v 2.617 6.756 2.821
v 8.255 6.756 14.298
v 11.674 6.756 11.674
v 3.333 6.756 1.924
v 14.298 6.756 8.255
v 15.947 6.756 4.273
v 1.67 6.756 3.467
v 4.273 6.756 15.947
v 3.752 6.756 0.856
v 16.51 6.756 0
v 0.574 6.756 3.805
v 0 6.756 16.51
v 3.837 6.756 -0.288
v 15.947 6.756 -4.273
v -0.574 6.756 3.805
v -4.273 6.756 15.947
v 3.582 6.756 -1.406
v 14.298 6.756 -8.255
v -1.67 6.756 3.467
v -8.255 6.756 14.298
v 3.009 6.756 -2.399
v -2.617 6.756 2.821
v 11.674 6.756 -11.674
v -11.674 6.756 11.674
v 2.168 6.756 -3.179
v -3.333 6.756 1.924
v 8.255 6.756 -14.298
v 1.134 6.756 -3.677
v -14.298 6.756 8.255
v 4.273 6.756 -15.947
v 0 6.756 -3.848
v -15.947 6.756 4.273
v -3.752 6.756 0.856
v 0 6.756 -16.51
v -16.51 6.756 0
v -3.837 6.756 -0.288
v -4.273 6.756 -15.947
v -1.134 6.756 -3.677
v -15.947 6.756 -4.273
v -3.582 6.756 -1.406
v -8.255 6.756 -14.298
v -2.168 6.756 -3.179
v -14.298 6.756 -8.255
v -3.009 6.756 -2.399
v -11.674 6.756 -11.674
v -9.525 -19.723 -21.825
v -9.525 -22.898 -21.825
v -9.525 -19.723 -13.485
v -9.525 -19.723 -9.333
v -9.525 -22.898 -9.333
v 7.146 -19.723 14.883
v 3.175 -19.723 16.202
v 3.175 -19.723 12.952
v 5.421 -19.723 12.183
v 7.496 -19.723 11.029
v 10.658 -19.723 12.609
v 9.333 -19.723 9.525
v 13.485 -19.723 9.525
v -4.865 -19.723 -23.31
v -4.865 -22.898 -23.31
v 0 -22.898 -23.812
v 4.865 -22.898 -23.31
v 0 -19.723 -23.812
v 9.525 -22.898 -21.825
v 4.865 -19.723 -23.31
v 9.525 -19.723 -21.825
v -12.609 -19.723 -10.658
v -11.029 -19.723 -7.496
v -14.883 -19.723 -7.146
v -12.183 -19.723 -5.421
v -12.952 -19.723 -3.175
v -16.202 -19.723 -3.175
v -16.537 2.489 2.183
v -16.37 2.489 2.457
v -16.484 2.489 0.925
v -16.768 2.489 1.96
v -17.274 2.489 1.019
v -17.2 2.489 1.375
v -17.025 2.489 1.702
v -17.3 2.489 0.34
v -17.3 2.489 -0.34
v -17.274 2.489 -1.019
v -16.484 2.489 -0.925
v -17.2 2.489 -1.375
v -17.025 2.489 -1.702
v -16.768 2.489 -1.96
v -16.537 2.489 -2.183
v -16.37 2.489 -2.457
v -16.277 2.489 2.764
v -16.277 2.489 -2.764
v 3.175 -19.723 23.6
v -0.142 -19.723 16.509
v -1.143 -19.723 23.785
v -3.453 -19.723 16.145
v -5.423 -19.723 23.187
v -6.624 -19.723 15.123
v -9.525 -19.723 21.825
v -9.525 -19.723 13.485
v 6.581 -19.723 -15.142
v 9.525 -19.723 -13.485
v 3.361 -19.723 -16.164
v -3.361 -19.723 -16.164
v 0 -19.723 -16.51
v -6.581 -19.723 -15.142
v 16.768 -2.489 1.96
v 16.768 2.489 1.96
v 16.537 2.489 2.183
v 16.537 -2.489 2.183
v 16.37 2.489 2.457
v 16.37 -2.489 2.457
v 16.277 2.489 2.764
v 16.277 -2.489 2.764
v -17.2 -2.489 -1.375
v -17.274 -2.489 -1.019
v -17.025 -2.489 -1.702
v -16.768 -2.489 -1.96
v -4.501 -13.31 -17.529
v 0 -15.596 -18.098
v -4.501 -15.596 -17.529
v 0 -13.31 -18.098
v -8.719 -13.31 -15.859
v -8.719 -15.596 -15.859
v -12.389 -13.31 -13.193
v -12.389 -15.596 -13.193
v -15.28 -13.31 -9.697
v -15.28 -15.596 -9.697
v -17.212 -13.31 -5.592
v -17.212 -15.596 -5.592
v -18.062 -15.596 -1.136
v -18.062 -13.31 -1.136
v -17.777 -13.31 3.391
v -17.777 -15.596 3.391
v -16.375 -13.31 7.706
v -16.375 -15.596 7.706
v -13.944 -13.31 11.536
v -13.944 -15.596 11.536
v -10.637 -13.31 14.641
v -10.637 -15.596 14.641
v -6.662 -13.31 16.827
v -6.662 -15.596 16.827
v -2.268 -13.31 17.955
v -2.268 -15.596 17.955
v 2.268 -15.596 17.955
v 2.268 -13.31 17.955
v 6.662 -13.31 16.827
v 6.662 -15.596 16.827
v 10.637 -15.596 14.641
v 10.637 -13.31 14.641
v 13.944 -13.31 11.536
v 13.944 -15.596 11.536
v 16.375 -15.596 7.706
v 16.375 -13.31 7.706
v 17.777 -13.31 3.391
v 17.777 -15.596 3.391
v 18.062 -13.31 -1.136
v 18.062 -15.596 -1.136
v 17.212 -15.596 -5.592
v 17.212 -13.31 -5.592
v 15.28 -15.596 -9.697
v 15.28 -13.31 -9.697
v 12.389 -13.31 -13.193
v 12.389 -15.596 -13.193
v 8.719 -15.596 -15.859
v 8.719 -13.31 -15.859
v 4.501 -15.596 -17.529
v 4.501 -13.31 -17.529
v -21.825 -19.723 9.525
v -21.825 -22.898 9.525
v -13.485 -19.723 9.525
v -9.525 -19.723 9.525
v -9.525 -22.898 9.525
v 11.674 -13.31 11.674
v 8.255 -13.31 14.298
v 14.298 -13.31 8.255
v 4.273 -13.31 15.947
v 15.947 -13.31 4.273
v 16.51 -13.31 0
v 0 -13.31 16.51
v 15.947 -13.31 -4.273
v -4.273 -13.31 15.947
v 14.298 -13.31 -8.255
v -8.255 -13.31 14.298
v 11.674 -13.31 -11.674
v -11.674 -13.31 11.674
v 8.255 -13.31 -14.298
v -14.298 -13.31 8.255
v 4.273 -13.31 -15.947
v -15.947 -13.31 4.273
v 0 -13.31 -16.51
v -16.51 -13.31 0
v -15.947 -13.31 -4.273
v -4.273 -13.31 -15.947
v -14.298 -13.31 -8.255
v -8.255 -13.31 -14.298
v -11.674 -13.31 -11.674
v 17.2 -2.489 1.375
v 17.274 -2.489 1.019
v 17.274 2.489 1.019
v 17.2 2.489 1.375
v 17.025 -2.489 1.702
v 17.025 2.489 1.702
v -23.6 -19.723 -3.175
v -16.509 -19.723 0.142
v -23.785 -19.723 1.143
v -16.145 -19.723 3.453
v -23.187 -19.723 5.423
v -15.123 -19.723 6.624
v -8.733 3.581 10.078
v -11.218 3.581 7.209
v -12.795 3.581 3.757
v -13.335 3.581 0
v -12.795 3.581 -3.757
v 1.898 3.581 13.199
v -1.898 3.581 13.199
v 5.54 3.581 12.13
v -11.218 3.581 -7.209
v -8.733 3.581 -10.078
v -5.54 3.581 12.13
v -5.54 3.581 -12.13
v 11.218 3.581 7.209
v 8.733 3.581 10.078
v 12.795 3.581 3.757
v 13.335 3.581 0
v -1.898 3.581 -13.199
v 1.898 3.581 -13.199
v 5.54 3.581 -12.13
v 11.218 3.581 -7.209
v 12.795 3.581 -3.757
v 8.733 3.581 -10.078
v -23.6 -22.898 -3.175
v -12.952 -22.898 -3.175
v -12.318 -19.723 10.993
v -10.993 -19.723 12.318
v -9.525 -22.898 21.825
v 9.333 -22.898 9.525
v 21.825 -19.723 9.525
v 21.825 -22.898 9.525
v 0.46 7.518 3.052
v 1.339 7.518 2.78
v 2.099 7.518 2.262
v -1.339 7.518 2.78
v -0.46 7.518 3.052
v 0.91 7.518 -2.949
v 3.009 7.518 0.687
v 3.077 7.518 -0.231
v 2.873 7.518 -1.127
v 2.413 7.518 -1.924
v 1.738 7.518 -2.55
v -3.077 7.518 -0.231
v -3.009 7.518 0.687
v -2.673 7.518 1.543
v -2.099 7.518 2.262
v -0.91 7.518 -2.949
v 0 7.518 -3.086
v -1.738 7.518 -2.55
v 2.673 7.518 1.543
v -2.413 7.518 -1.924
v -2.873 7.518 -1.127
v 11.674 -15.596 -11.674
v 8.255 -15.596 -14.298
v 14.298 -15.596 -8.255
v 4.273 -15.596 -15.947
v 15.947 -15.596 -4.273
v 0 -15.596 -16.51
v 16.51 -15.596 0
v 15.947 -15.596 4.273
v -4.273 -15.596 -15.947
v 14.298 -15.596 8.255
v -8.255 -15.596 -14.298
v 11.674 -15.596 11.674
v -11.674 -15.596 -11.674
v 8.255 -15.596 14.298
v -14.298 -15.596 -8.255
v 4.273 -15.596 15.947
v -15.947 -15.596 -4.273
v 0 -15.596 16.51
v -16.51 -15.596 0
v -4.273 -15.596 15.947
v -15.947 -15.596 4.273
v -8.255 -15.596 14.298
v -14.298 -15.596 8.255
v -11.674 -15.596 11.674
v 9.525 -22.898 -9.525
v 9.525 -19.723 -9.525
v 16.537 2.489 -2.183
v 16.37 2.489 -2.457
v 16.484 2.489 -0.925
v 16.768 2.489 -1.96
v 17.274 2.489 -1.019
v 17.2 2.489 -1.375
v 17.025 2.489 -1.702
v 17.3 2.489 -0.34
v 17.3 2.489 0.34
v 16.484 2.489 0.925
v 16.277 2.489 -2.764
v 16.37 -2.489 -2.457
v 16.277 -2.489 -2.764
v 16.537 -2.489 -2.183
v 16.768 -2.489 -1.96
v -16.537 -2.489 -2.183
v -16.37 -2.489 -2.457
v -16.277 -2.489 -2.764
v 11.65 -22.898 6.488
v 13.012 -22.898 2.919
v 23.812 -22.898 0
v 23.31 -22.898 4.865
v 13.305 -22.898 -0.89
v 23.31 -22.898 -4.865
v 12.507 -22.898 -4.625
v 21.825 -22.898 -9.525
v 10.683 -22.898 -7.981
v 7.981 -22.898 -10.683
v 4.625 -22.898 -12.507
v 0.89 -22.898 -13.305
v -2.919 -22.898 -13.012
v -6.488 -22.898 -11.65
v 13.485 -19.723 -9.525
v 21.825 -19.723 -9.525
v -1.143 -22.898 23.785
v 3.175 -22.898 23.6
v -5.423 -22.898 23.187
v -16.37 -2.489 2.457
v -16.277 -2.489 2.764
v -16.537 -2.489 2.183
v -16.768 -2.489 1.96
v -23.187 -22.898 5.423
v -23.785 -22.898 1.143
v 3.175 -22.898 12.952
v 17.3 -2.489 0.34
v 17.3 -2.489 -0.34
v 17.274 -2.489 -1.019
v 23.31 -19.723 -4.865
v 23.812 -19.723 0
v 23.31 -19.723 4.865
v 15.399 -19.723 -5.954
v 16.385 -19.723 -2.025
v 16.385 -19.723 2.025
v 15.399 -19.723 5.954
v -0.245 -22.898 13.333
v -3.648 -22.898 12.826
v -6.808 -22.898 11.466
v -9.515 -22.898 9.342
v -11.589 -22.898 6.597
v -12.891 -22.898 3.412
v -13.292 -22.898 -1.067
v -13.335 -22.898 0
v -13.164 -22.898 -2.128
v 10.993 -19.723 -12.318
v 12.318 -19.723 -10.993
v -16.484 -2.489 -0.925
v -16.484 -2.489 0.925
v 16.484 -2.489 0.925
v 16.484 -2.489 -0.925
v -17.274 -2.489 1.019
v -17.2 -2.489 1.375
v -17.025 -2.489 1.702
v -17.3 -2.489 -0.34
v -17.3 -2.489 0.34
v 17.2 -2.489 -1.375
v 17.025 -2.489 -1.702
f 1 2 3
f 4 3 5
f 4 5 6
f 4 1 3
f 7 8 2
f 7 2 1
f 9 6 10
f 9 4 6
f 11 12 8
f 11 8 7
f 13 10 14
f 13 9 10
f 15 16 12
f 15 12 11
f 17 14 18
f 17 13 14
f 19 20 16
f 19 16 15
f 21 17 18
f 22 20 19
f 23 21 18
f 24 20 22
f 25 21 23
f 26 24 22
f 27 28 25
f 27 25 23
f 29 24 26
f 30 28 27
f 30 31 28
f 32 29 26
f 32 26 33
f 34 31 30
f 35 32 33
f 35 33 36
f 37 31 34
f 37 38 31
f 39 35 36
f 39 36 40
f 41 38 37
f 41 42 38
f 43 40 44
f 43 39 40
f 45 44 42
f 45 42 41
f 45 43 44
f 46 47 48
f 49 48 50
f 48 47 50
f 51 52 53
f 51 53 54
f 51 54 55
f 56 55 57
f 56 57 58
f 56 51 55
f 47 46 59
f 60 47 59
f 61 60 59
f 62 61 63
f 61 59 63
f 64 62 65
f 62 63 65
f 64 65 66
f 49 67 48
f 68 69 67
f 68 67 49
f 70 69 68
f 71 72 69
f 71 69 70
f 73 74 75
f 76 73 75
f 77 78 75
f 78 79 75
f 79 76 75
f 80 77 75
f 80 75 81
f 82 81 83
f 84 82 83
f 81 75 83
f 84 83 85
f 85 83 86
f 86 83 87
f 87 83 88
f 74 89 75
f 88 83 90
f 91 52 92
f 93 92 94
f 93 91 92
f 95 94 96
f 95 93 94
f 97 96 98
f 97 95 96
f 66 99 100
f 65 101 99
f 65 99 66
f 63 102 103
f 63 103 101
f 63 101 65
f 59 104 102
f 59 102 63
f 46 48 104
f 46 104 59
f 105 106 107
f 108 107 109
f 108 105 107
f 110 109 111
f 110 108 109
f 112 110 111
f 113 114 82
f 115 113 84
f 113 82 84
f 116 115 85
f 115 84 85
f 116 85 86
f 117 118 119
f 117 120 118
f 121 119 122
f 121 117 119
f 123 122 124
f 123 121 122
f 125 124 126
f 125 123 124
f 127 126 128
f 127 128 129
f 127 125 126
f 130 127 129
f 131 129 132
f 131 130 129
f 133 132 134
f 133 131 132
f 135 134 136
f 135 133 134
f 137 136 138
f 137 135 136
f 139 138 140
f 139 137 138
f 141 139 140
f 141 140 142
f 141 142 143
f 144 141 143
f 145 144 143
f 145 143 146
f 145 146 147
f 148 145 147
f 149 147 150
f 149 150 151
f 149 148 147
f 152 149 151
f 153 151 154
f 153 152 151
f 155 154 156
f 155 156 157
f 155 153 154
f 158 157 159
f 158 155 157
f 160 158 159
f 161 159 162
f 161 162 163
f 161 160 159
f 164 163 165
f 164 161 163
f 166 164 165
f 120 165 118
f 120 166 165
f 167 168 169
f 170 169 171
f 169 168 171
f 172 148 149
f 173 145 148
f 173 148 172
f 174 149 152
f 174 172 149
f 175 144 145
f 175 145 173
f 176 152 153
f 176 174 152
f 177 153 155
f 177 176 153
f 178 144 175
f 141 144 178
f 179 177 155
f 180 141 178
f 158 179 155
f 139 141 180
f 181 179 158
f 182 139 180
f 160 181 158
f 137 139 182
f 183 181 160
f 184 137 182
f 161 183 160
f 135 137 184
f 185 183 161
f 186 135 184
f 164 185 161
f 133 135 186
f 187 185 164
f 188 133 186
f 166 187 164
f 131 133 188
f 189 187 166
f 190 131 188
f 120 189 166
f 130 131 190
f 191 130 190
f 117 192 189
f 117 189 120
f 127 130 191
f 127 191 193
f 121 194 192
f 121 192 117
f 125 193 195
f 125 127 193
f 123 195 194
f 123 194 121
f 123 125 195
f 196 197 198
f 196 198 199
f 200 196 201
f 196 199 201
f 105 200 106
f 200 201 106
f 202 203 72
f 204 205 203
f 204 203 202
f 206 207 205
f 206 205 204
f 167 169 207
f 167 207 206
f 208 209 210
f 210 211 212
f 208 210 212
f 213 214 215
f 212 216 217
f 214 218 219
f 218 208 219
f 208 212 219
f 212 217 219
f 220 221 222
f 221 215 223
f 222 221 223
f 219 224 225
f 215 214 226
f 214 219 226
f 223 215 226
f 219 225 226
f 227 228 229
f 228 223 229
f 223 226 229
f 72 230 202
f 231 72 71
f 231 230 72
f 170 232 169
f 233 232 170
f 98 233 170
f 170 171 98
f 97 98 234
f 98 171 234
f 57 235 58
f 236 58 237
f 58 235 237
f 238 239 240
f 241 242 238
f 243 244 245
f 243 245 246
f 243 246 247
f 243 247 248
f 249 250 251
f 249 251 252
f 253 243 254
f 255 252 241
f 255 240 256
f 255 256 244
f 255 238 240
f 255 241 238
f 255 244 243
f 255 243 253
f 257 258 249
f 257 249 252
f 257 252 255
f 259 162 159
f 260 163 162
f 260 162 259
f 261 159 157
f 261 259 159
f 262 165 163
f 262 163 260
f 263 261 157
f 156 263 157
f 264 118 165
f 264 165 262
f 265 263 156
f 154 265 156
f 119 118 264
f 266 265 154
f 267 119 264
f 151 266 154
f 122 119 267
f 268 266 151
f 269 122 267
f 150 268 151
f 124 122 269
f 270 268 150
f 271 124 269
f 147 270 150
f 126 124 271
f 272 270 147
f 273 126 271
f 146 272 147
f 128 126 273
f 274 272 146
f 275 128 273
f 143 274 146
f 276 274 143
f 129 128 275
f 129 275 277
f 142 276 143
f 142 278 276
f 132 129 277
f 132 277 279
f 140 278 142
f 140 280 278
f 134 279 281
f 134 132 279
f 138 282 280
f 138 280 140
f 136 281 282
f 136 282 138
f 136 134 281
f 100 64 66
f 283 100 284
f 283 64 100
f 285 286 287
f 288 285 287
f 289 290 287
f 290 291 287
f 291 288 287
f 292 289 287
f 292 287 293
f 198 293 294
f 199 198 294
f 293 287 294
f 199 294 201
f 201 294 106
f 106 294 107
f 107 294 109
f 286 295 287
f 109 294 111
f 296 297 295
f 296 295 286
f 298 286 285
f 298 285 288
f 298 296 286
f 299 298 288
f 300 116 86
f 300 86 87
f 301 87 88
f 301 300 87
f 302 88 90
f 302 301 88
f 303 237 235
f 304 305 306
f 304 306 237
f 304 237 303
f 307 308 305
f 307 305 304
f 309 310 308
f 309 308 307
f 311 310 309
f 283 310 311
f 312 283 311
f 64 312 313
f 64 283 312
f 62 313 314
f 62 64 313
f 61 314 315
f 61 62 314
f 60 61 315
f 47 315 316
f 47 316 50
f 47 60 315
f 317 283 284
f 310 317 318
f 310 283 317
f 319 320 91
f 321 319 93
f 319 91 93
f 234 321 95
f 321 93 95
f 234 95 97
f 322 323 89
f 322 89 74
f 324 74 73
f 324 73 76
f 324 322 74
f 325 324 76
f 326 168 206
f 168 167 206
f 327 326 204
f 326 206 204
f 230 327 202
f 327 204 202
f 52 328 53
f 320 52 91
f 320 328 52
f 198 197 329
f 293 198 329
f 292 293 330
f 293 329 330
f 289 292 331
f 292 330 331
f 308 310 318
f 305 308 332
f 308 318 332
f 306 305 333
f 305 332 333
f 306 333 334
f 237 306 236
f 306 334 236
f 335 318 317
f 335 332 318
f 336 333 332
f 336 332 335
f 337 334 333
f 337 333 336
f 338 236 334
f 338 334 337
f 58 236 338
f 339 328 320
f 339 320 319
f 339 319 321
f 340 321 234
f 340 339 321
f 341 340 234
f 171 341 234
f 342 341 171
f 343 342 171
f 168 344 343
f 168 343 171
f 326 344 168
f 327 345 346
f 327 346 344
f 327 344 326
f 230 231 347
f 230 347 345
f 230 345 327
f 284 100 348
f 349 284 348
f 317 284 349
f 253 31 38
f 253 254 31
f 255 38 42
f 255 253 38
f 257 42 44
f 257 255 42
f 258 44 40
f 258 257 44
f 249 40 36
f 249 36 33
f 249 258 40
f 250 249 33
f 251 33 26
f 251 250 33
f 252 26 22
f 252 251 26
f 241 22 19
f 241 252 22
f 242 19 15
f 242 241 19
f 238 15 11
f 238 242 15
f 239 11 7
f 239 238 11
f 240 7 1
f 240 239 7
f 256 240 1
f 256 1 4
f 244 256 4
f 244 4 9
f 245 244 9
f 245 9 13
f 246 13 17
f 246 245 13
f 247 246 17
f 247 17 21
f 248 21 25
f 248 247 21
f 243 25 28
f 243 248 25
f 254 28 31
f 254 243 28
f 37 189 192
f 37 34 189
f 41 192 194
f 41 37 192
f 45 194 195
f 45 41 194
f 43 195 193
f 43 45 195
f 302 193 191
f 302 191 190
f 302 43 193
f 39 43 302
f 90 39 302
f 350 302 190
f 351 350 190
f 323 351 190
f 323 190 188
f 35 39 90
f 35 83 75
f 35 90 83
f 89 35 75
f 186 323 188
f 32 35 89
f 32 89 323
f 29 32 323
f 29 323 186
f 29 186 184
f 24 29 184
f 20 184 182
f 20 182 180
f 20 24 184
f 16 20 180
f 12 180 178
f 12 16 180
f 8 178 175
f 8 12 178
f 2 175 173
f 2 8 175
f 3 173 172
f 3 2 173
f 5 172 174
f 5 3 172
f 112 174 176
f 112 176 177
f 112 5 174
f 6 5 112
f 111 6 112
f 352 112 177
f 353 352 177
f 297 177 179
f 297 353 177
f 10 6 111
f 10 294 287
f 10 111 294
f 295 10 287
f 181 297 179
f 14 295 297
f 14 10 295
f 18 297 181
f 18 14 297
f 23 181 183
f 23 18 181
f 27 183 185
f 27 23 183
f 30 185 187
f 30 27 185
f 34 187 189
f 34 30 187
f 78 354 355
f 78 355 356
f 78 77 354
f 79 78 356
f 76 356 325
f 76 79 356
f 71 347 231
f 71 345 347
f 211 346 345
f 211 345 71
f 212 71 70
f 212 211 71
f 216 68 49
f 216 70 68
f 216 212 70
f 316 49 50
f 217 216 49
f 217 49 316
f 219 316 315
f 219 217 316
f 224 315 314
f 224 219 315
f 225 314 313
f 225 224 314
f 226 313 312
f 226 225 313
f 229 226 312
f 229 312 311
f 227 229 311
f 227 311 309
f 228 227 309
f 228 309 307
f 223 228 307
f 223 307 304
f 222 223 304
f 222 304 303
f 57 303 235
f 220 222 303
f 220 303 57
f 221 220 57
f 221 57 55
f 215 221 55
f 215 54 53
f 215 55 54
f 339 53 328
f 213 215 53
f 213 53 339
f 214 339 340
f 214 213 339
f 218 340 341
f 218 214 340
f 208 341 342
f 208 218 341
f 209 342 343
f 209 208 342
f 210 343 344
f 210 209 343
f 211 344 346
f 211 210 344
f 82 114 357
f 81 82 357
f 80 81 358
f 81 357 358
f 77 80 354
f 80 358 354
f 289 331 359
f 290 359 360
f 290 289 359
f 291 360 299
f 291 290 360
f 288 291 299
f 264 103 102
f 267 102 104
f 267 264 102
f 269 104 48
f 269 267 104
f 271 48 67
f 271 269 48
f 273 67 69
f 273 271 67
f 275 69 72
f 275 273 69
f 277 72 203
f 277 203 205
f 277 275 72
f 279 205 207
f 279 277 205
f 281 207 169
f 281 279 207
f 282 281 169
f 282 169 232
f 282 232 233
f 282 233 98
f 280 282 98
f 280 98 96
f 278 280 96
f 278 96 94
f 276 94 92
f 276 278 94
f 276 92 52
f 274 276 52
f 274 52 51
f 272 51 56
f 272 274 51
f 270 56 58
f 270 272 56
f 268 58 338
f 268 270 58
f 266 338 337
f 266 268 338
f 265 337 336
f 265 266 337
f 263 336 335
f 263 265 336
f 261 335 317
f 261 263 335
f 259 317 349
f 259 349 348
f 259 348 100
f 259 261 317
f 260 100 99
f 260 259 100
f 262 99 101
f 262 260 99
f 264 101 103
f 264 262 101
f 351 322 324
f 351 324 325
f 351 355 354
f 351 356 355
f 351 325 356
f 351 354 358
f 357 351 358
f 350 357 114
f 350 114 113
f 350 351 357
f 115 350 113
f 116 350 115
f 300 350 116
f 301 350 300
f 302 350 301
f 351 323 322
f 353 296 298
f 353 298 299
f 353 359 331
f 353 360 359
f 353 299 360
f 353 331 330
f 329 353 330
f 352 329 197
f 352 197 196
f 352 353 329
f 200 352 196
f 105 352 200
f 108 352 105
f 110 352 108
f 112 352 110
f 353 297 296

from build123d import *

# Parameters (mm, degrees)
FILLET1_R          = 4.064
SKETCH10_W         = 2.857500069
SKETCH10_H         = 7.5184
REVOLVE3_ANGLE     = 20
CUT_EXTRUDE1_START = 1.27
CUT_EXTRUDE1_DEPTH = 4.9784
CIRPATTERN4_COUNT  = 2
FILLET8_R          = 1.27
FILLET9_R          = 1.27
SKETCH13_W         = 23.8125
SKETCH13_H         = 35.179
SKETCH14_W         = 18.870013955
SKETCH14_H         = 18.870013955
SKETCH14_W_2       = 25.220013955
SKETCH14_H_2       = 25.220013955
CUT_EXTRUDE2_DEPTH = 3.175
SKETCH17_W         = 13.335
SKETCH17_H         = 31.241914403


with BuildPart() as part:
    # Sketch1 → Revolve1 (revolve)
    with BuildSketch(Plane.XY, mode=Mode.PRIVATE) as revolve1_sk:
        Polygon((0, 9.1059), (-20.6375, 9.1059), (-20.6375, 5.042647059), (-17.78, 5.042647059), (-17.78, -5.042647059), (-20.6375, -5.042647059), (-20.6375, -19.7231), (-16.51, -19.7231), (-16.51, -15.5956), (-18.0975, -15.5956), (-18.0975, -13.3096), (-16.51, -13.3096), (-16.51, 6.7564), (-3.8481, 6.7564), (-3.0861, 7.5184), (0, 7.5184), align=None)
    revolve(revolve1_sk.sketch.rotate(Axis((0, 0, 0), (0, 1, 0)), 270), axis=Axis((0, 0, 0), (0, 1, 0)))

    # Fillet1
    # the kernel refuses this fillet: 4.064 mm, written as the material it takes off along each edge
    with BuildSketch(Plane(origin=(0, 9.1059, 0), x_dir=(0, 0, -1), z_dir=(1, 0, 0))) as fillet1_piece_1:
        with BuildLine():
            CenterArc((16.573500069, -4.064), FILLET1_R, 0.010532312, 89.989467688)
            Line((20.6375, -4.063252941), (20.718779999, -4.063238))
            Line((20.718779999, -4.063238), (20.71878, 0))
            Line((20.71878, 0), (20.6375, 0.08128))
            Line((20.6375, 0.08128), (16.573500069, 0.08128))
            Line((16.573500069, 0.08128), (16.573500069, 0))
        make_face()
    revolve(axis=Axis((0, 9.1059, 0), (0, 1, 0)), mode=Mode.SUBTRACT)

    # Sketch10 → Revolve3 (revolve, symmetric)
    with BuildSketch(Plane.XY) as revolve3_sk:
        with Locations((-19.208750034, 0)):
            Rectangle(SKETCH10_W, SKETCH10_H)
    revolve3 = revolve(axis=Axis((0, 0, 0), (0, 1, 0)), revolution_arc=REVOLVE3_ANGLE / 2)
    revolve3 = revolve3 + revolve(revolve3_sk.sketch, axis=Axis((0, 0, 0), (0, -1, 0)), revolution_arc=REVOLVE3_ANGLE / 2)

    # Sketch12 → Cut-Extrude1 (cut)
    with BuildSketch(Plane(origin=(0, -3.7592, 0), x_dir=(1, 0, 0), z_dir=(0, 1, 0)).offset(CUT_EXTRUDE1_START)):
        with BuildLine():
            Line((-7.313638514, 0), (-17.215440903, 1.745954919))
            ThreePointArc((-17.215440903, 1.745954919), (-17.30375, 0), (-17.215440903, -1.745954919))
            Line((-17.215440903, -1.745954919), (-7.313638514, 0))
        make_face()
    cut_extrude1 = extrude(amount=CUT_EXTRUDE1_DEPTH, mode=Mode.SUBTRACT)

    # CirPattern4: Revolve3, Cut-Extrude1 ×2 about axis
    cirpattern4_axis = Axis((0, 0, 0), (0, 1, 0))
    add([revolve3.rotate(cirpattern4_axis, i * 360 / CIRPATTERN4_COUNT) for i in range(1, CIRPATTERN4_COUNT)])
    add([cut_extrude1.rotate(cirpattern4_axis, i * 360 / CIRPATTERN4_COUNT) for i in range(1, CIRPATTERN4_COUNT)], mode=Mode.SUBTRACT)

    # Fillet8
    # the kernel refuses this fillet: 1.27 mm, written as the material it takes off along each edge
    with BuildSketch(Plane(origin=(-16.431533746, -2.4892, -1.607730937), x_dir=(0.1324793231915166, 0, -0.9911857691304479), z_dir=(0, 1, 0)), Plane(origin=(16.431533746, -2.4892, 1.607730937), x_dir=(-0.13247932319151873, 0, 0.9911857691304475), z_dir=(0, 1, 0))) as fillet8_piece_1:
        with BuildLine():
            CenterArc((1.211424462, 1.269207194), FILLET8_R, 201.909884157, 66.065503548)
            Line((0.033154154, 0.795309438), (0.009588748, 0.785831483))
            ThreePointArc((0.009588748, 0.785831483), (-0.008800881, 0.398712653), (-0.025377958, 0.001057934))
            Line((-0.025377958, 0.001057934), (0.000897351, -0.025384144))
            ThreePointArc((0.000897351, -0.025384144), (0.583278445, -0.01509352), (1.165659538, -0.025384144))
            Line((1.165659538, -0.025384144), (1.166556889, 0))
        make_face()
    extrude(amount=4.9784, mode=Mode.SUBTRACT)
    with BuildSketch(Plane(origin=(-16.431533746, -2.4892, 1.607730937), x_dir=(0.13247932319152245, 0, 0.9911857691304472), z_dir=(0, 1, 0)), Plane(origin=(16.431533746, -2.4892, -1.607730937), x_dir=(-0.13247932319151992, 0, -0.9911857691304475), z_dir=(0, 1, 0))) as fillet8_piece_2:
        with BuildLine():
            CenterArc((1.211424462, -1.269207194), FILLET8_R, 92.024612295, 66.065503548)
            Line((0.033154154, -0.795309438), (0.009588748, -0.785831483))
            ThreePointArc((0.009588748, -0.785831483), (-0.008800881, -0.398712653), (-0.025377958, -0.001057934))
            Line((-0.025377958, -0.001057934), (0.000897351, 0.025384144))
            ThreePointArc((0.000897351, 0.025384144), (0.583278445, 0.01509352), (1.165659538, 0.025384144))
            Line((1.165659538, 0.025384144), (1.166556889, 0))
        make_face()
    extrude(amount=4.9784, mode=Mode.SUBTRACT)

    # Fillet9
    fillet9_edges = [part.edges().sort_by_distance(p)[0] for p in [
        (-17.215440903, 0, 1.745954919),
        (-17.215440903, 0, -1.745954919),
        (17.215440903, 0, -1.745954919),
        (17.215440903, 0, 1.745954919),
    ]]
    fillet(fillet9_edges, radius=FILLET9_R)


with BuildPart() as body_2:
    # Sketch13 → Revolve4 (revolve)
    with BuildSketch(Plane.XY):
        with Locations((-11.90625, -5.3086)):
            Rectangle(SKETCH13_W, SKETCH13_H)
    revolve(axis=Axis((0, 12.2809, 0), (0, -1, 0)))

    # Intersect1: read off the stored shape, not the designer's step
    # Intersect1: cut part
    add(part.part, mode=Mode.SUBTRACT)

    # Sketch14 → Cut-Extrude2 (cut)
    with BuildSketch(Plane.XZ.offset(22.8981)):
        with Locations((-18.960006978, 18.960006978)):
            Rectangle(SKETCH14_W, SKETCH14_H)
        with Locations((15.785006978, 18.960006978)):
            Rectangle(SKETCH14_W_2, SKETCH14_H)
        with Locations((-18.960006978, -15.785006978)):
            Rectangle(SKETCH14_W, SKETCH14_H_2)
        with Locations((18.960006978, -18.960006978)):
            Rectangle(SKETCH14_W, SKETCH14_H)
    extrude(amount=-CUT_EXTRUDE2_DEPTH, mode=Mode.SUBTRACT)

    # Sketch16 → Cut-Revolve4 (revolve, cut)
    with BuildSketch(Plane.XY):
        Polygon((17.616090936, -19.7231), (24.456472079, -19.7231), (24.456472079, 14.393066261), (0, 14.393066261), (0, 7.5184), (17.616090936, 7.5184), (17.616090936, -12.224103068), (18.894097, -12.224103068), (18.894097, -16.204339712), (17.616090936, -16.204339712), align=None)
    revolve(axis=Axis((0, 0, 0), (0, -1, 0)), mode=Mode.SUBTRACT)

    # Sketch17 → Cut-Revolve5 (revolve, cut)
    with BuildSketch(Plane.XY, mode=Mode.PRIVATE) as cut_revolve5_sk:
        with Locations((6.6675, -12.039557201)):
            Rectangle(SKETCH17_W, SKETCH17_H)
    revolve(cut_revolve5_sk.sketch.rotate(Axis((0, 3.5814, 0), (0, -1, 0)), 180), axis=Axis((0, 3.5814, 0), (0, -1, 0)), mode=Mode.SUBTRACT)


solid = body_2.part
